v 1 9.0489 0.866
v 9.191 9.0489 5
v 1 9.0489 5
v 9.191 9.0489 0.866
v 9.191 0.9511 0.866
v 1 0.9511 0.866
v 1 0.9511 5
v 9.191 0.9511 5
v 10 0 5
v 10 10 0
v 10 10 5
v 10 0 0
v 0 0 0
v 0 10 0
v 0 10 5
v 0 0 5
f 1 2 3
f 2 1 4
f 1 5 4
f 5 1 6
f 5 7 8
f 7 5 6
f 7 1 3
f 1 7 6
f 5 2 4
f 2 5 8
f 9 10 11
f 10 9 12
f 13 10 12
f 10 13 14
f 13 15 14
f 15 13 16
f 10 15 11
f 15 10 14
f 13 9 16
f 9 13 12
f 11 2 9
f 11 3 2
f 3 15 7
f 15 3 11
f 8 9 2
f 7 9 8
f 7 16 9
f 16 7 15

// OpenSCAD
// ### Usage #########################################################
intersection() {
  shell() cube([10, 10, 10]);
  cube([10, 10, 5]);
}


// ### Module ########################################################

module shell(t = 1) {
  intersection() {
    children();
    // Minkowski Sum: Solid Convolution
    render(convexity = 2) { 
      minkowski() {
        // Negative image of children
        difference() {
          // Universe shape: Larger than children
          minkowski() {
            children();
            cube(1, center = true); // Minkowski tool
          }
          children();
        }
        sphere(r = t); // Minkowski tool
      } 
    }
  }
}
